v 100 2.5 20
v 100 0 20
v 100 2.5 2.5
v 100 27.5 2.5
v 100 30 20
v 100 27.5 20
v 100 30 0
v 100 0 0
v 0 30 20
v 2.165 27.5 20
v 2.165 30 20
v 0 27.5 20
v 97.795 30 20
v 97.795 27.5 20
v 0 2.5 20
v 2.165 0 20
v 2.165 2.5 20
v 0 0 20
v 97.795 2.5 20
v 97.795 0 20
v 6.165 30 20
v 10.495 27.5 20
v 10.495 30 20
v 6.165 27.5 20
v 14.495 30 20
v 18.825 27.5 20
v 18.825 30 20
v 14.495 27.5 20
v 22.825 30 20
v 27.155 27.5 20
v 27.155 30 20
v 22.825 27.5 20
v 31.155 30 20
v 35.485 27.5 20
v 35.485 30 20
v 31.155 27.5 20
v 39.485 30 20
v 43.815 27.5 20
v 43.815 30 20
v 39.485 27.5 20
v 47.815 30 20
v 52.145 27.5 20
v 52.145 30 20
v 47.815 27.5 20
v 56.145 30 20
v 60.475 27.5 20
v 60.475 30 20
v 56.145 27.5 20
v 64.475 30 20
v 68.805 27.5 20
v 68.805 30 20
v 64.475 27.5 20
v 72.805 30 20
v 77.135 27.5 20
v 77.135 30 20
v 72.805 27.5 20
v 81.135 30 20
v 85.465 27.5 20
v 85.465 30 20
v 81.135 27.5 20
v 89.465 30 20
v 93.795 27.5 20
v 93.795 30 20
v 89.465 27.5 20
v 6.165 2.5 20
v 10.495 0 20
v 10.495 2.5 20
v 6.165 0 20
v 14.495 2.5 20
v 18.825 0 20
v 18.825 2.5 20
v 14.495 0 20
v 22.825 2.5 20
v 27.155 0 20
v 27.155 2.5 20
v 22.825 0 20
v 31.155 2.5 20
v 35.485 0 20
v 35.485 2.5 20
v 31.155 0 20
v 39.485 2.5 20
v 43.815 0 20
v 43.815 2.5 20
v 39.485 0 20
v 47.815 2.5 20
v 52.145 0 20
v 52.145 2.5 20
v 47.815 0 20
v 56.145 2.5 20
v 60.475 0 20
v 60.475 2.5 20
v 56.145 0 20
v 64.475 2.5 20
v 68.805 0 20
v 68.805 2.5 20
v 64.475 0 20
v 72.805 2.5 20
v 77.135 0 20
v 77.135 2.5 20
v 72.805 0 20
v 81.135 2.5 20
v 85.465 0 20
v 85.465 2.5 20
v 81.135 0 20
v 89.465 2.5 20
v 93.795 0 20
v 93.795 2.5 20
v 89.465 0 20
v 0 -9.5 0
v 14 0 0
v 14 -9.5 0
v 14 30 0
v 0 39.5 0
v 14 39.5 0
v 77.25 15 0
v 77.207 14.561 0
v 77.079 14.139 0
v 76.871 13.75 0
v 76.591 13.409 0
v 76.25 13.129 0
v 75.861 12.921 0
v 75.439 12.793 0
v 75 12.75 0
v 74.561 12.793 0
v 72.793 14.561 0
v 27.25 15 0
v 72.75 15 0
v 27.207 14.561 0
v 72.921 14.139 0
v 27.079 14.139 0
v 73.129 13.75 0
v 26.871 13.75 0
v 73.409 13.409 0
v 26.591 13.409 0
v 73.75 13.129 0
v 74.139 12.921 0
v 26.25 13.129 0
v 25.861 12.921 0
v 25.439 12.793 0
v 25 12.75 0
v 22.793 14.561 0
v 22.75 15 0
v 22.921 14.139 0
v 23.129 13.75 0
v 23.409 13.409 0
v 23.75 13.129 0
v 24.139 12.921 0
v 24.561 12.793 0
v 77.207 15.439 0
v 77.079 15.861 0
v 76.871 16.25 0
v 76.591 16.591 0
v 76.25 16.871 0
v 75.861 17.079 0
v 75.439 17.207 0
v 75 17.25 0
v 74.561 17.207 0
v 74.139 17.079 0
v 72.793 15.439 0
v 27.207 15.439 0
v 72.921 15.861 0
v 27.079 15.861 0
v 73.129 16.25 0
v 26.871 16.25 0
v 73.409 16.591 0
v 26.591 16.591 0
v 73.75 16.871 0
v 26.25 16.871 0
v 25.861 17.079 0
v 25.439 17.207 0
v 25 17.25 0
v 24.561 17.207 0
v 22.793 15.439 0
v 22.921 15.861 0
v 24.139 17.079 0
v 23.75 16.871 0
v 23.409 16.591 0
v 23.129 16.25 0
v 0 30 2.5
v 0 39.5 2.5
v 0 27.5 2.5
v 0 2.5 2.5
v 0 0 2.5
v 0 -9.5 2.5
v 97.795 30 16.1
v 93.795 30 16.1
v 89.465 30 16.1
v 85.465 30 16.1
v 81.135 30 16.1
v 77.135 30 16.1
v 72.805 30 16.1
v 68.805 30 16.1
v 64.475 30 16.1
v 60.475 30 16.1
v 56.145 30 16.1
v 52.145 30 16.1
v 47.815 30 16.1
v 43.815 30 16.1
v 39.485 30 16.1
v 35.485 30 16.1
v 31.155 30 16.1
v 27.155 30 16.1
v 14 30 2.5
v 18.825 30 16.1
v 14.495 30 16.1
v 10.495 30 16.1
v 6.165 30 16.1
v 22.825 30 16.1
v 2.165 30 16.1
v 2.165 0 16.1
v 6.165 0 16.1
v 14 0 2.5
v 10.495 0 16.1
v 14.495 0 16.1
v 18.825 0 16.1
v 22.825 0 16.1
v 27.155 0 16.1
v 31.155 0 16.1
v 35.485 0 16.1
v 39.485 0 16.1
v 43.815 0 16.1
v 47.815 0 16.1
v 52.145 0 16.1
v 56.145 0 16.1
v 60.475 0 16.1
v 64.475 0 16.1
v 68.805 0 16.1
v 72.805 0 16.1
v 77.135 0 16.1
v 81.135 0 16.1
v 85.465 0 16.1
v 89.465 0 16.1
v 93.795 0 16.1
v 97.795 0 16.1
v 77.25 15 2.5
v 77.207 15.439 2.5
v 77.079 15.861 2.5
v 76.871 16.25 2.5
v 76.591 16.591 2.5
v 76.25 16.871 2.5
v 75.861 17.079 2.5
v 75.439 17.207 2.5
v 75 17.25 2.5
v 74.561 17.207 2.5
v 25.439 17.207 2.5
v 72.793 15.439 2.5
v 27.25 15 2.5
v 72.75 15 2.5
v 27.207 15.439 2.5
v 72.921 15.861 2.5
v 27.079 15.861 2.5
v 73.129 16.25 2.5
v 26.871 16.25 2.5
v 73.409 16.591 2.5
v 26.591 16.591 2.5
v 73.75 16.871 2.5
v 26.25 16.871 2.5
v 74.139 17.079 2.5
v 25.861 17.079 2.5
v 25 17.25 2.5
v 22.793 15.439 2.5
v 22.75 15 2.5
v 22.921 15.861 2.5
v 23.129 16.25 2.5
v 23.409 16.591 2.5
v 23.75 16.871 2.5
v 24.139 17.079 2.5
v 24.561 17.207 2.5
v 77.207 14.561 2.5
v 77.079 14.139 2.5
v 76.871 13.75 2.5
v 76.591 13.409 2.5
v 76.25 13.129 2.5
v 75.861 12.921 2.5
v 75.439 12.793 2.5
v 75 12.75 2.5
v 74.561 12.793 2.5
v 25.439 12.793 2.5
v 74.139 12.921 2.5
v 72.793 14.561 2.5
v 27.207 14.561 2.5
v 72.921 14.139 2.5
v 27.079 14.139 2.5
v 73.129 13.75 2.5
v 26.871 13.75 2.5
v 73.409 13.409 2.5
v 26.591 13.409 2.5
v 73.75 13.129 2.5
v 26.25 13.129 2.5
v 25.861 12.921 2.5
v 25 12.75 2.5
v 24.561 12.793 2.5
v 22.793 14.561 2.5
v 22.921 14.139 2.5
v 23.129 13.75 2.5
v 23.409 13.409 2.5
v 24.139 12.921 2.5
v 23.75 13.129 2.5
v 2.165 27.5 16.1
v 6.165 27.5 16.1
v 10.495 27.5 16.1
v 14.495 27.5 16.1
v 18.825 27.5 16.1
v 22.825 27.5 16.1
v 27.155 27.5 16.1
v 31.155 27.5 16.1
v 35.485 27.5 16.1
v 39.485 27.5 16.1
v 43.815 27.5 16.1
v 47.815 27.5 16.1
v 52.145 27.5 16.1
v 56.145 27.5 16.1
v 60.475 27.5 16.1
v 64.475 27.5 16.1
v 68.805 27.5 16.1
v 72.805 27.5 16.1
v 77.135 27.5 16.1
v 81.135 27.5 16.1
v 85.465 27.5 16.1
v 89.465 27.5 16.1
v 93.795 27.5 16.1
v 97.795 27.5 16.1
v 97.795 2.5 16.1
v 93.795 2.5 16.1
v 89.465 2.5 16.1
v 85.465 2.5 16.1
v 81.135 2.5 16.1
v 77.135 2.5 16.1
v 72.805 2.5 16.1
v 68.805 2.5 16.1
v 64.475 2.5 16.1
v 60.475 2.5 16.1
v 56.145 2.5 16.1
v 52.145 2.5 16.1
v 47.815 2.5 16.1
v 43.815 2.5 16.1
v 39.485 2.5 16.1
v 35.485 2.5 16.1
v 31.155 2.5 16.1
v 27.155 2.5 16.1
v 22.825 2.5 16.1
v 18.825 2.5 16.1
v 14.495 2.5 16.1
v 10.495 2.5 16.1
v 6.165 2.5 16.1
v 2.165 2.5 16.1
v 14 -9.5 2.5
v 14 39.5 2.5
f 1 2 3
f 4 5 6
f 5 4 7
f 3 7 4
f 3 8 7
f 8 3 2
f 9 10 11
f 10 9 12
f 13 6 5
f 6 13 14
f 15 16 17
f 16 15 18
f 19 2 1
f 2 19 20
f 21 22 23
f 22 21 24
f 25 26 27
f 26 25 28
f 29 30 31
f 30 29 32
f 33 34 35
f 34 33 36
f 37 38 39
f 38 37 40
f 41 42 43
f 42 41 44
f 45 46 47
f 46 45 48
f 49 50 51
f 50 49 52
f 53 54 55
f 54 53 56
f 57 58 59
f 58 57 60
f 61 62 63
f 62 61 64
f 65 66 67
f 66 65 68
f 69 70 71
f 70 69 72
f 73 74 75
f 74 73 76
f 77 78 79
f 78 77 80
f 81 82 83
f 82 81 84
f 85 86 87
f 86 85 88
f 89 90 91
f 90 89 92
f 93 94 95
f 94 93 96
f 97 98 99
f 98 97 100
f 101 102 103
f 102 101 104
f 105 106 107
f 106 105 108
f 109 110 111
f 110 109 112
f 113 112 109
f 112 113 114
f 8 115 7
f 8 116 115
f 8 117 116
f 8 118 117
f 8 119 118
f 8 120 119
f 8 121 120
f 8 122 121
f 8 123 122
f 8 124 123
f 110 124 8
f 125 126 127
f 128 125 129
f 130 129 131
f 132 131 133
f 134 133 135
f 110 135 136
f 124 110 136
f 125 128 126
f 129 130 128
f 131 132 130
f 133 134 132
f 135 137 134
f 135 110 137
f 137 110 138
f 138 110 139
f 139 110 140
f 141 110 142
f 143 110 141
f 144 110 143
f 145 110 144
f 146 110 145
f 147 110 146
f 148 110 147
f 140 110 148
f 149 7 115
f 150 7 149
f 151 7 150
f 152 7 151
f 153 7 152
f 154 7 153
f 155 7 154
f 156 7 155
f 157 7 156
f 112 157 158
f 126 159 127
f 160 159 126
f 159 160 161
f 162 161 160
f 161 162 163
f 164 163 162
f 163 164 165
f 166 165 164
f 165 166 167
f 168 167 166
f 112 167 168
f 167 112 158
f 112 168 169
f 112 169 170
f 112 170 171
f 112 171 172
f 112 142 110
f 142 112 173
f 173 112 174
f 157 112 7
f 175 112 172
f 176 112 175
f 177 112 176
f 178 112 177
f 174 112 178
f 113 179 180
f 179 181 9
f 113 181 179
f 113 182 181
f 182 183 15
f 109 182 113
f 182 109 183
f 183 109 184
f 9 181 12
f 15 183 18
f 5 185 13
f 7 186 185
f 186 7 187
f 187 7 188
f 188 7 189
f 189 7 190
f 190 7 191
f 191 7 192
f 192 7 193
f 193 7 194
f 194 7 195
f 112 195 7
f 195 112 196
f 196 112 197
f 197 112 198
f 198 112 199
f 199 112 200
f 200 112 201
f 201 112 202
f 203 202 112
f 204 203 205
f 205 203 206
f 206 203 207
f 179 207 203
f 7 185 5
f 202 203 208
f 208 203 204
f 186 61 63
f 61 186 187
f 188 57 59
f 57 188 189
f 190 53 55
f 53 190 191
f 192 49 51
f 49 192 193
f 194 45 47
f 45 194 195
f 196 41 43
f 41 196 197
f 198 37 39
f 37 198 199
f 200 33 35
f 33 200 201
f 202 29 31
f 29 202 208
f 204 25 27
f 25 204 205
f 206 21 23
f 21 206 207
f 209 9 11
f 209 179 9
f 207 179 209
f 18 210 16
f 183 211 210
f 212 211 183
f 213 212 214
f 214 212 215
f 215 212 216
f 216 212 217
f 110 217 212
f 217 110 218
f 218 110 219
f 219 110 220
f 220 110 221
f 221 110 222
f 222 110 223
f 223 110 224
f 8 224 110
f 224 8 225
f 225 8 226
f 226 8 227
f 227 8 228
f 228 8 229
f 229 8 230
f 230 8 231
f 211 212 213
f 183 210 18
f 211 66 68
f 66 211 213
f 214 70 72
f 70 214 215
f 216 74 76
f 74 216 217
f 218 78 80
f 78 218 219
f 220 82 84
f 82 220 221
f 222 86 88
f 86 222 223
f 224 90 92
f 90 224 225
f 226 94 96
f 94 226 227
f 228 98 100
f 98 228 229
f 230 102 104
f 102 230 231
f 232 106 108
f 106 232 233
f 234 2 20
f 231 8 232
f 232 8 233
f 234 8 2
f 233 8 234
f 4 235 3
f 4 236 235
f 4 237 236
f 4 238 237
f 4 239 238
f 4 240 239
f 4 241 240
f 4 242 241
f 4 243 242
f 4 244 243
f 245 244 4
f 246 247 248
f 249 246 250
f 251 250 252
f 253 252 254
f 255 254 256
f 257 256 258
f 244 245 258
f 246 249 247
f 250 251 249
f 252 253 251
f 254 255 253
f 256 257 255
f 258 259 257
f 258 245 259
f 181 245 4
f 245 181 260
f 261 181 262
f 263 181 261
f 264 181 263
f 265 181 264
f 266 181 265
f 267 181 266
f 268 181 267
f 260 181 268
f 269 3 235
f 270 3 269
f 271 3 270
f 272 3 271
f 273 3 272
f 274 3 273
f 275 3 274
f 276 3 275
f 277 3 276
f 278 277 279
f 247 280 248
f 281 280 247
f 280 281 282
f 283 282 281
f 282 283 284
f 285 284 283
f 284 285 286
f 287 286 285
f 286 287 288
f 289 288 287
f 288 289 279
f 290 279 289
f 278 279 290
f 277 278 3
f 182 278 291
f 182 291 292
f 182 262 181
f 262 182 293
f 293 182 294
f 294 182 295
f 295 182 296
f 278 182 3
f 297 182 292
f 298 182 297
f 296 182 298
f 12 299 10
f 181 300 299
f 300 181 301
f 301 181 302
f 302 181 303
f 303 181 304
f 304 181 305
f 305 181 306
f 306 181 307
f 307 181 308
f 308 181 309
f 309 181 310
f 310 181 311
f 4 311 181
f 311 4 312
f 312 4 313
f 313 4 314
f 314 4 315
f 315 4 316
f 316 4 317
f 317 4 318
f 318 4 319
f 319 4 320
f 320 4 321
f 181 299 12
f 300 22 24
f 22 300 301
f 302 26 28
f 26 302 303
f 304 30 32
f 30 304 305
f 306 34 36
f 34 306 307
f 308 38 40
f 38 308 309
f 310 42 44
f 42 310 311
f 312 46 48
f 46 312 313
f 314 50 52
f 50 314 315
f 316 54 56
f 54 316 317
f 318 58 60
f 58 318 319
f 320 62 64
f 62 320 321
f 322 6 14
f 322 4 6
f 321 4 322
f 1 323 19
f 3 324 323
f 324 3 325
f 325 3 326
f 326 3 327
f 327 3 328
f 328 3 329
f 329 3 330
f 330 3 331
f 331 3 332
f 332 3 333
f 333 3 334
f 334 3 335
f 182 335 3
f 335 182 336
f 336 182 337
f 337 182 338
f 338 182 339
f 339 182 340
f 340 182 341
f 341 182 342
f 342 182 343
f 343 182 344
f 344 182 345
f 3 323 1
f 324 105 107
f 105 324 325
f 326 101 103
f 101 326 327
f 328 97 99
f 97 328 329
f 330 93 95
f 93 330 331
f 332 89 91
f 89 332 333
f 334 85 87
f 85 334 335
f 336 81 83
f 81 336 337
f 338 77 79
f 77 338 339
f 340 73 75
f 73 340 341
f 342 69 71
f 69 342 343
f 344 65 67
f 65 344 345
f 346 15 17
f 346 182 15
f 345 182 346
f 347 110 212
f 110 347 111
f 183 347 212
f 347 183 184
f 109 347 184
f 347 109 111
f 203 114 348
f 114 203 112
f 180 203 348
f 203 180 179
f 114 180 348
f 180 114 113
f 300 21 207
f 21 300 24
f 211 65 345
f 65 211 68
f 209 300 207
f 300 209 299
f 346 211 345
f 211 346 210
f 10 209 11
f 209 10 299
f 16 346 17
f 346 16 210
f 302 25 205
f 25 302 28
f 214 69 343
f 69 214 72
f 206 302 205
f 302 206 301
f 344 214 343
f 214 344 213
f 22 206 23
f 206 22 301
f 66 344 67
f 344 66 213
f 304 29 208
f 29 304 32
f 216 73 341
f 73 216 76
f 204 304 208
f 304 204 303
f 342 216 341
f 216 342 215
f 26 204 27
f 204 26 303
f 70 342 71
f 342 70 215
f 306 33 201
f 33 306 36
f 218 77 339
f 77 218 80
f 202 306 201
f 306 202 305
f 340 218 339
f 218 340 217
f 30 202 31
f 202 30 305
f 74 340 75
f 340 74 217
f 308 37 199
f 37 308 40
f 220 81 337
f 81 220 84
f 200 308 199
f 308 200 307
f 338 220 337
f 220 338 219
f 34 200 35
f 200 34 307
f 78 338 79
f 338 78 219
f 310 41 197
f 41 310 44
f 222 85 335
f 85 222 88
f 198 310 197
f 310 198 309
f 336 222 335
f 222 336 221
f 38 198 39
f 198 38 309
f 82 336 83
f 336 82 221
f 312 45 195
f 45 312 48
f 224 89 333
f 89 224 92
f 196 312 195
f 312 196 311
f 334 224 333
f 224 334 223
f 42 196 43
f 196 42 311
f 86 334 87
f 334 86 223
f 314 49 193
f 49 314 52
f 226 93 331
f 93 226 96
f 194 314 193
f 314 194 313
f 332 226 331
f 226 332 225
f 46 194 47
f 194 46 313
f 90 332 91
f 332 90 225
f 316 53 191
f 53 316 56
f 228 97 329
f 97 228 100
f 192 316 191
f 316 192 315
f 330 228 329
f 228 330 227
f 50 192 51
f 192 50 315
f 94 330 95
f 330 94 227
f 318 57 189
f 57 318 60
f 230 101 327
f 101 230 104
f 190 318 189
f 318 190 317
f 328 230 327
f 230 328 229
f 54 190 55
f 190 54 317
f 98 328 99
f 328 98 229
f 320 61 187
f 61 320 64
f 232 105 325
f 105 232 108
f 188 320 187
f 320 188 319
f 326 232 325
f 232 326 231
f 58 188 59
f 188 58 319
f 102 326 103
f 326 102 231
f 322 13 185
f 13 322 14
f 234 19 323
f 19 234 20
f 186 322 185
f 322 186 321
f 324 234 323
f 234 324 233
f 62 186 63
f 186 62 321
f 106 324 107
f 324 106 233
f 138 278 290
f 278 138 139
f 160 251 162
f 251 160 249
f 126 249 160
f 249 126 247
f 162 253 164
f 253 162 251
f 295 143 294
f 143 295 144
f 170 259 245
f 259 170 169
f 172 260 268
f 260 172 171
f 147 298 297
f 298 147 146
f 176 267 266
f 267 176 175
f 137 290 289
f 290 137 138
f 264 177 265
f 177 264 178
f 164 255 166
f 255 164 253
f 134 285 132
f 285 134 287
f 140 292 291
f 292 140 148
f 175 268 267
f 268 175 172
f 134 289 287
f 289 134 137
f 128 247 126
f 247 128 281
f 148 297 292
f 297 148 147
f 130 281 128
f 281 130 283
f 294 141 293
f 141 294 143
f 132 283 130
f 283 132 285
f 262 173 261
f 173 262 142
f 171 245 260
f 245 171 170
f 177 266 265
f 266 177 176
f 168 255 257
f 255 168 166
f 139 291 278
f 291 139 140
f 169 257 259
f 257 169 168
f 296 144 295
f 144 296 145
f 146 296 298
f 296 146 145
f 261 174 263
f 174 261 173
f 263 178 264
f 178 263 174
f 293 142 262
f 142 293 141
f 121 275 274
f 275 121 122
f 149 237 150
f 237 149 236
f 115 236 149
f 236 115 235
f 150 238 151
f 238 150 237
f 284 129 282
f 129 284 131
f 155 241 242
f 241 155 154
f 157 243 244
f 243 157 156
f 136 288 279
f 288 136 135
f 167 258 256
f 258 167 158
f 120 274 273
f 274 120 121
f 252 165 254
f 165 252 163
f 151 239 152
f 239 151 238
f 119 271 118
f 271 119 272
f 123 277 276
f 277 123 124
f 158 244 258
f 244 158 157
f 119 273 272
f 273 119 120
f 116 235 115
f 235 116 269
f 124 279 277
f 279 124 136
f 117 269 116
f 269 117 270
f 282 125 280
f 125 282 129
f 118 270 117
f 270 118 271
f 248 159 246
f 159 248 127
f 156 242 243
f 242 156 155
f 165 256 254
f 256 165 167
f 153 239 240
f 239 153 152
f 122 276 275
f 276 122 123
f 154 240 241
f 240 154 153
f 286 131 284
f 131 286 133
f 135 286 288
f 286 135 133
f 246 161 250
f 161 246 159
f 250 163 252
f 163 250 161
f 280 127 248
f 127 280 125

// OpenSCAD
$fn = 32;

// ----------------------------------------------------------------------
// Cable duct: 100 x 30 x 20 mm, 12 fingers
// ----------------------------------------------------------------------

// --- parameters (mm) ---
tray_len = 100;           // duct length, X
tray_w = 30;              // duct width, Y
tray_h = 20;              // duct height, Z
tray_t = 2.5;             // side wall thickness
floor_t = 2.5;            // floor thickness
slot_w = 4;               // finger slot width
slot_h = 13.6;            // finger slot height
fingers = 12;             // number of finger slots per side
pitch = 8.33;             // finger pitch
hole_d = 4.5;             // floor mounting hole
hole_n = 2;               // mounting holes in the floor
ear_w = 10.5;             // mounting ear width
ear_l = 14;               // mounting ear length

module shell() {
  difference() {
    cube([tray_len, tray_w, tray_h]);
    /* open top channel */
    translate([-tray_t - 1, tray_t, floor_t])
      cube([tray_len + 2 * tray_t + 2, tray_w - 2 * tray_t, tray_h + 1]);
  }
}

module ears() {
  translate([0, -ear_w + 1, 0]) cube([ear_l, ear_w, floor_t]);
  translate([0, tray_w - 1, 0]) cube([ear_l, ear_w, floor_t]);
}

difference() {
  union() {
    shell();
    ears();
  }
  /* finger slots cut through both side walls */
  for (i = [0 : fingers - 1]) translate([pitch / 2 + i * pitch - slot_w / 2, -1, floor_t + slot_h]) cube([slot_w, tray_w + 2, tray_h]);
  for (i = [0 : hole_n - 1]) translate([(tray_len / hole_n) * (i + 0.5), tray_w / 2, -1]) cylinder(h = floor_t + 2, d = hole_d);
}
